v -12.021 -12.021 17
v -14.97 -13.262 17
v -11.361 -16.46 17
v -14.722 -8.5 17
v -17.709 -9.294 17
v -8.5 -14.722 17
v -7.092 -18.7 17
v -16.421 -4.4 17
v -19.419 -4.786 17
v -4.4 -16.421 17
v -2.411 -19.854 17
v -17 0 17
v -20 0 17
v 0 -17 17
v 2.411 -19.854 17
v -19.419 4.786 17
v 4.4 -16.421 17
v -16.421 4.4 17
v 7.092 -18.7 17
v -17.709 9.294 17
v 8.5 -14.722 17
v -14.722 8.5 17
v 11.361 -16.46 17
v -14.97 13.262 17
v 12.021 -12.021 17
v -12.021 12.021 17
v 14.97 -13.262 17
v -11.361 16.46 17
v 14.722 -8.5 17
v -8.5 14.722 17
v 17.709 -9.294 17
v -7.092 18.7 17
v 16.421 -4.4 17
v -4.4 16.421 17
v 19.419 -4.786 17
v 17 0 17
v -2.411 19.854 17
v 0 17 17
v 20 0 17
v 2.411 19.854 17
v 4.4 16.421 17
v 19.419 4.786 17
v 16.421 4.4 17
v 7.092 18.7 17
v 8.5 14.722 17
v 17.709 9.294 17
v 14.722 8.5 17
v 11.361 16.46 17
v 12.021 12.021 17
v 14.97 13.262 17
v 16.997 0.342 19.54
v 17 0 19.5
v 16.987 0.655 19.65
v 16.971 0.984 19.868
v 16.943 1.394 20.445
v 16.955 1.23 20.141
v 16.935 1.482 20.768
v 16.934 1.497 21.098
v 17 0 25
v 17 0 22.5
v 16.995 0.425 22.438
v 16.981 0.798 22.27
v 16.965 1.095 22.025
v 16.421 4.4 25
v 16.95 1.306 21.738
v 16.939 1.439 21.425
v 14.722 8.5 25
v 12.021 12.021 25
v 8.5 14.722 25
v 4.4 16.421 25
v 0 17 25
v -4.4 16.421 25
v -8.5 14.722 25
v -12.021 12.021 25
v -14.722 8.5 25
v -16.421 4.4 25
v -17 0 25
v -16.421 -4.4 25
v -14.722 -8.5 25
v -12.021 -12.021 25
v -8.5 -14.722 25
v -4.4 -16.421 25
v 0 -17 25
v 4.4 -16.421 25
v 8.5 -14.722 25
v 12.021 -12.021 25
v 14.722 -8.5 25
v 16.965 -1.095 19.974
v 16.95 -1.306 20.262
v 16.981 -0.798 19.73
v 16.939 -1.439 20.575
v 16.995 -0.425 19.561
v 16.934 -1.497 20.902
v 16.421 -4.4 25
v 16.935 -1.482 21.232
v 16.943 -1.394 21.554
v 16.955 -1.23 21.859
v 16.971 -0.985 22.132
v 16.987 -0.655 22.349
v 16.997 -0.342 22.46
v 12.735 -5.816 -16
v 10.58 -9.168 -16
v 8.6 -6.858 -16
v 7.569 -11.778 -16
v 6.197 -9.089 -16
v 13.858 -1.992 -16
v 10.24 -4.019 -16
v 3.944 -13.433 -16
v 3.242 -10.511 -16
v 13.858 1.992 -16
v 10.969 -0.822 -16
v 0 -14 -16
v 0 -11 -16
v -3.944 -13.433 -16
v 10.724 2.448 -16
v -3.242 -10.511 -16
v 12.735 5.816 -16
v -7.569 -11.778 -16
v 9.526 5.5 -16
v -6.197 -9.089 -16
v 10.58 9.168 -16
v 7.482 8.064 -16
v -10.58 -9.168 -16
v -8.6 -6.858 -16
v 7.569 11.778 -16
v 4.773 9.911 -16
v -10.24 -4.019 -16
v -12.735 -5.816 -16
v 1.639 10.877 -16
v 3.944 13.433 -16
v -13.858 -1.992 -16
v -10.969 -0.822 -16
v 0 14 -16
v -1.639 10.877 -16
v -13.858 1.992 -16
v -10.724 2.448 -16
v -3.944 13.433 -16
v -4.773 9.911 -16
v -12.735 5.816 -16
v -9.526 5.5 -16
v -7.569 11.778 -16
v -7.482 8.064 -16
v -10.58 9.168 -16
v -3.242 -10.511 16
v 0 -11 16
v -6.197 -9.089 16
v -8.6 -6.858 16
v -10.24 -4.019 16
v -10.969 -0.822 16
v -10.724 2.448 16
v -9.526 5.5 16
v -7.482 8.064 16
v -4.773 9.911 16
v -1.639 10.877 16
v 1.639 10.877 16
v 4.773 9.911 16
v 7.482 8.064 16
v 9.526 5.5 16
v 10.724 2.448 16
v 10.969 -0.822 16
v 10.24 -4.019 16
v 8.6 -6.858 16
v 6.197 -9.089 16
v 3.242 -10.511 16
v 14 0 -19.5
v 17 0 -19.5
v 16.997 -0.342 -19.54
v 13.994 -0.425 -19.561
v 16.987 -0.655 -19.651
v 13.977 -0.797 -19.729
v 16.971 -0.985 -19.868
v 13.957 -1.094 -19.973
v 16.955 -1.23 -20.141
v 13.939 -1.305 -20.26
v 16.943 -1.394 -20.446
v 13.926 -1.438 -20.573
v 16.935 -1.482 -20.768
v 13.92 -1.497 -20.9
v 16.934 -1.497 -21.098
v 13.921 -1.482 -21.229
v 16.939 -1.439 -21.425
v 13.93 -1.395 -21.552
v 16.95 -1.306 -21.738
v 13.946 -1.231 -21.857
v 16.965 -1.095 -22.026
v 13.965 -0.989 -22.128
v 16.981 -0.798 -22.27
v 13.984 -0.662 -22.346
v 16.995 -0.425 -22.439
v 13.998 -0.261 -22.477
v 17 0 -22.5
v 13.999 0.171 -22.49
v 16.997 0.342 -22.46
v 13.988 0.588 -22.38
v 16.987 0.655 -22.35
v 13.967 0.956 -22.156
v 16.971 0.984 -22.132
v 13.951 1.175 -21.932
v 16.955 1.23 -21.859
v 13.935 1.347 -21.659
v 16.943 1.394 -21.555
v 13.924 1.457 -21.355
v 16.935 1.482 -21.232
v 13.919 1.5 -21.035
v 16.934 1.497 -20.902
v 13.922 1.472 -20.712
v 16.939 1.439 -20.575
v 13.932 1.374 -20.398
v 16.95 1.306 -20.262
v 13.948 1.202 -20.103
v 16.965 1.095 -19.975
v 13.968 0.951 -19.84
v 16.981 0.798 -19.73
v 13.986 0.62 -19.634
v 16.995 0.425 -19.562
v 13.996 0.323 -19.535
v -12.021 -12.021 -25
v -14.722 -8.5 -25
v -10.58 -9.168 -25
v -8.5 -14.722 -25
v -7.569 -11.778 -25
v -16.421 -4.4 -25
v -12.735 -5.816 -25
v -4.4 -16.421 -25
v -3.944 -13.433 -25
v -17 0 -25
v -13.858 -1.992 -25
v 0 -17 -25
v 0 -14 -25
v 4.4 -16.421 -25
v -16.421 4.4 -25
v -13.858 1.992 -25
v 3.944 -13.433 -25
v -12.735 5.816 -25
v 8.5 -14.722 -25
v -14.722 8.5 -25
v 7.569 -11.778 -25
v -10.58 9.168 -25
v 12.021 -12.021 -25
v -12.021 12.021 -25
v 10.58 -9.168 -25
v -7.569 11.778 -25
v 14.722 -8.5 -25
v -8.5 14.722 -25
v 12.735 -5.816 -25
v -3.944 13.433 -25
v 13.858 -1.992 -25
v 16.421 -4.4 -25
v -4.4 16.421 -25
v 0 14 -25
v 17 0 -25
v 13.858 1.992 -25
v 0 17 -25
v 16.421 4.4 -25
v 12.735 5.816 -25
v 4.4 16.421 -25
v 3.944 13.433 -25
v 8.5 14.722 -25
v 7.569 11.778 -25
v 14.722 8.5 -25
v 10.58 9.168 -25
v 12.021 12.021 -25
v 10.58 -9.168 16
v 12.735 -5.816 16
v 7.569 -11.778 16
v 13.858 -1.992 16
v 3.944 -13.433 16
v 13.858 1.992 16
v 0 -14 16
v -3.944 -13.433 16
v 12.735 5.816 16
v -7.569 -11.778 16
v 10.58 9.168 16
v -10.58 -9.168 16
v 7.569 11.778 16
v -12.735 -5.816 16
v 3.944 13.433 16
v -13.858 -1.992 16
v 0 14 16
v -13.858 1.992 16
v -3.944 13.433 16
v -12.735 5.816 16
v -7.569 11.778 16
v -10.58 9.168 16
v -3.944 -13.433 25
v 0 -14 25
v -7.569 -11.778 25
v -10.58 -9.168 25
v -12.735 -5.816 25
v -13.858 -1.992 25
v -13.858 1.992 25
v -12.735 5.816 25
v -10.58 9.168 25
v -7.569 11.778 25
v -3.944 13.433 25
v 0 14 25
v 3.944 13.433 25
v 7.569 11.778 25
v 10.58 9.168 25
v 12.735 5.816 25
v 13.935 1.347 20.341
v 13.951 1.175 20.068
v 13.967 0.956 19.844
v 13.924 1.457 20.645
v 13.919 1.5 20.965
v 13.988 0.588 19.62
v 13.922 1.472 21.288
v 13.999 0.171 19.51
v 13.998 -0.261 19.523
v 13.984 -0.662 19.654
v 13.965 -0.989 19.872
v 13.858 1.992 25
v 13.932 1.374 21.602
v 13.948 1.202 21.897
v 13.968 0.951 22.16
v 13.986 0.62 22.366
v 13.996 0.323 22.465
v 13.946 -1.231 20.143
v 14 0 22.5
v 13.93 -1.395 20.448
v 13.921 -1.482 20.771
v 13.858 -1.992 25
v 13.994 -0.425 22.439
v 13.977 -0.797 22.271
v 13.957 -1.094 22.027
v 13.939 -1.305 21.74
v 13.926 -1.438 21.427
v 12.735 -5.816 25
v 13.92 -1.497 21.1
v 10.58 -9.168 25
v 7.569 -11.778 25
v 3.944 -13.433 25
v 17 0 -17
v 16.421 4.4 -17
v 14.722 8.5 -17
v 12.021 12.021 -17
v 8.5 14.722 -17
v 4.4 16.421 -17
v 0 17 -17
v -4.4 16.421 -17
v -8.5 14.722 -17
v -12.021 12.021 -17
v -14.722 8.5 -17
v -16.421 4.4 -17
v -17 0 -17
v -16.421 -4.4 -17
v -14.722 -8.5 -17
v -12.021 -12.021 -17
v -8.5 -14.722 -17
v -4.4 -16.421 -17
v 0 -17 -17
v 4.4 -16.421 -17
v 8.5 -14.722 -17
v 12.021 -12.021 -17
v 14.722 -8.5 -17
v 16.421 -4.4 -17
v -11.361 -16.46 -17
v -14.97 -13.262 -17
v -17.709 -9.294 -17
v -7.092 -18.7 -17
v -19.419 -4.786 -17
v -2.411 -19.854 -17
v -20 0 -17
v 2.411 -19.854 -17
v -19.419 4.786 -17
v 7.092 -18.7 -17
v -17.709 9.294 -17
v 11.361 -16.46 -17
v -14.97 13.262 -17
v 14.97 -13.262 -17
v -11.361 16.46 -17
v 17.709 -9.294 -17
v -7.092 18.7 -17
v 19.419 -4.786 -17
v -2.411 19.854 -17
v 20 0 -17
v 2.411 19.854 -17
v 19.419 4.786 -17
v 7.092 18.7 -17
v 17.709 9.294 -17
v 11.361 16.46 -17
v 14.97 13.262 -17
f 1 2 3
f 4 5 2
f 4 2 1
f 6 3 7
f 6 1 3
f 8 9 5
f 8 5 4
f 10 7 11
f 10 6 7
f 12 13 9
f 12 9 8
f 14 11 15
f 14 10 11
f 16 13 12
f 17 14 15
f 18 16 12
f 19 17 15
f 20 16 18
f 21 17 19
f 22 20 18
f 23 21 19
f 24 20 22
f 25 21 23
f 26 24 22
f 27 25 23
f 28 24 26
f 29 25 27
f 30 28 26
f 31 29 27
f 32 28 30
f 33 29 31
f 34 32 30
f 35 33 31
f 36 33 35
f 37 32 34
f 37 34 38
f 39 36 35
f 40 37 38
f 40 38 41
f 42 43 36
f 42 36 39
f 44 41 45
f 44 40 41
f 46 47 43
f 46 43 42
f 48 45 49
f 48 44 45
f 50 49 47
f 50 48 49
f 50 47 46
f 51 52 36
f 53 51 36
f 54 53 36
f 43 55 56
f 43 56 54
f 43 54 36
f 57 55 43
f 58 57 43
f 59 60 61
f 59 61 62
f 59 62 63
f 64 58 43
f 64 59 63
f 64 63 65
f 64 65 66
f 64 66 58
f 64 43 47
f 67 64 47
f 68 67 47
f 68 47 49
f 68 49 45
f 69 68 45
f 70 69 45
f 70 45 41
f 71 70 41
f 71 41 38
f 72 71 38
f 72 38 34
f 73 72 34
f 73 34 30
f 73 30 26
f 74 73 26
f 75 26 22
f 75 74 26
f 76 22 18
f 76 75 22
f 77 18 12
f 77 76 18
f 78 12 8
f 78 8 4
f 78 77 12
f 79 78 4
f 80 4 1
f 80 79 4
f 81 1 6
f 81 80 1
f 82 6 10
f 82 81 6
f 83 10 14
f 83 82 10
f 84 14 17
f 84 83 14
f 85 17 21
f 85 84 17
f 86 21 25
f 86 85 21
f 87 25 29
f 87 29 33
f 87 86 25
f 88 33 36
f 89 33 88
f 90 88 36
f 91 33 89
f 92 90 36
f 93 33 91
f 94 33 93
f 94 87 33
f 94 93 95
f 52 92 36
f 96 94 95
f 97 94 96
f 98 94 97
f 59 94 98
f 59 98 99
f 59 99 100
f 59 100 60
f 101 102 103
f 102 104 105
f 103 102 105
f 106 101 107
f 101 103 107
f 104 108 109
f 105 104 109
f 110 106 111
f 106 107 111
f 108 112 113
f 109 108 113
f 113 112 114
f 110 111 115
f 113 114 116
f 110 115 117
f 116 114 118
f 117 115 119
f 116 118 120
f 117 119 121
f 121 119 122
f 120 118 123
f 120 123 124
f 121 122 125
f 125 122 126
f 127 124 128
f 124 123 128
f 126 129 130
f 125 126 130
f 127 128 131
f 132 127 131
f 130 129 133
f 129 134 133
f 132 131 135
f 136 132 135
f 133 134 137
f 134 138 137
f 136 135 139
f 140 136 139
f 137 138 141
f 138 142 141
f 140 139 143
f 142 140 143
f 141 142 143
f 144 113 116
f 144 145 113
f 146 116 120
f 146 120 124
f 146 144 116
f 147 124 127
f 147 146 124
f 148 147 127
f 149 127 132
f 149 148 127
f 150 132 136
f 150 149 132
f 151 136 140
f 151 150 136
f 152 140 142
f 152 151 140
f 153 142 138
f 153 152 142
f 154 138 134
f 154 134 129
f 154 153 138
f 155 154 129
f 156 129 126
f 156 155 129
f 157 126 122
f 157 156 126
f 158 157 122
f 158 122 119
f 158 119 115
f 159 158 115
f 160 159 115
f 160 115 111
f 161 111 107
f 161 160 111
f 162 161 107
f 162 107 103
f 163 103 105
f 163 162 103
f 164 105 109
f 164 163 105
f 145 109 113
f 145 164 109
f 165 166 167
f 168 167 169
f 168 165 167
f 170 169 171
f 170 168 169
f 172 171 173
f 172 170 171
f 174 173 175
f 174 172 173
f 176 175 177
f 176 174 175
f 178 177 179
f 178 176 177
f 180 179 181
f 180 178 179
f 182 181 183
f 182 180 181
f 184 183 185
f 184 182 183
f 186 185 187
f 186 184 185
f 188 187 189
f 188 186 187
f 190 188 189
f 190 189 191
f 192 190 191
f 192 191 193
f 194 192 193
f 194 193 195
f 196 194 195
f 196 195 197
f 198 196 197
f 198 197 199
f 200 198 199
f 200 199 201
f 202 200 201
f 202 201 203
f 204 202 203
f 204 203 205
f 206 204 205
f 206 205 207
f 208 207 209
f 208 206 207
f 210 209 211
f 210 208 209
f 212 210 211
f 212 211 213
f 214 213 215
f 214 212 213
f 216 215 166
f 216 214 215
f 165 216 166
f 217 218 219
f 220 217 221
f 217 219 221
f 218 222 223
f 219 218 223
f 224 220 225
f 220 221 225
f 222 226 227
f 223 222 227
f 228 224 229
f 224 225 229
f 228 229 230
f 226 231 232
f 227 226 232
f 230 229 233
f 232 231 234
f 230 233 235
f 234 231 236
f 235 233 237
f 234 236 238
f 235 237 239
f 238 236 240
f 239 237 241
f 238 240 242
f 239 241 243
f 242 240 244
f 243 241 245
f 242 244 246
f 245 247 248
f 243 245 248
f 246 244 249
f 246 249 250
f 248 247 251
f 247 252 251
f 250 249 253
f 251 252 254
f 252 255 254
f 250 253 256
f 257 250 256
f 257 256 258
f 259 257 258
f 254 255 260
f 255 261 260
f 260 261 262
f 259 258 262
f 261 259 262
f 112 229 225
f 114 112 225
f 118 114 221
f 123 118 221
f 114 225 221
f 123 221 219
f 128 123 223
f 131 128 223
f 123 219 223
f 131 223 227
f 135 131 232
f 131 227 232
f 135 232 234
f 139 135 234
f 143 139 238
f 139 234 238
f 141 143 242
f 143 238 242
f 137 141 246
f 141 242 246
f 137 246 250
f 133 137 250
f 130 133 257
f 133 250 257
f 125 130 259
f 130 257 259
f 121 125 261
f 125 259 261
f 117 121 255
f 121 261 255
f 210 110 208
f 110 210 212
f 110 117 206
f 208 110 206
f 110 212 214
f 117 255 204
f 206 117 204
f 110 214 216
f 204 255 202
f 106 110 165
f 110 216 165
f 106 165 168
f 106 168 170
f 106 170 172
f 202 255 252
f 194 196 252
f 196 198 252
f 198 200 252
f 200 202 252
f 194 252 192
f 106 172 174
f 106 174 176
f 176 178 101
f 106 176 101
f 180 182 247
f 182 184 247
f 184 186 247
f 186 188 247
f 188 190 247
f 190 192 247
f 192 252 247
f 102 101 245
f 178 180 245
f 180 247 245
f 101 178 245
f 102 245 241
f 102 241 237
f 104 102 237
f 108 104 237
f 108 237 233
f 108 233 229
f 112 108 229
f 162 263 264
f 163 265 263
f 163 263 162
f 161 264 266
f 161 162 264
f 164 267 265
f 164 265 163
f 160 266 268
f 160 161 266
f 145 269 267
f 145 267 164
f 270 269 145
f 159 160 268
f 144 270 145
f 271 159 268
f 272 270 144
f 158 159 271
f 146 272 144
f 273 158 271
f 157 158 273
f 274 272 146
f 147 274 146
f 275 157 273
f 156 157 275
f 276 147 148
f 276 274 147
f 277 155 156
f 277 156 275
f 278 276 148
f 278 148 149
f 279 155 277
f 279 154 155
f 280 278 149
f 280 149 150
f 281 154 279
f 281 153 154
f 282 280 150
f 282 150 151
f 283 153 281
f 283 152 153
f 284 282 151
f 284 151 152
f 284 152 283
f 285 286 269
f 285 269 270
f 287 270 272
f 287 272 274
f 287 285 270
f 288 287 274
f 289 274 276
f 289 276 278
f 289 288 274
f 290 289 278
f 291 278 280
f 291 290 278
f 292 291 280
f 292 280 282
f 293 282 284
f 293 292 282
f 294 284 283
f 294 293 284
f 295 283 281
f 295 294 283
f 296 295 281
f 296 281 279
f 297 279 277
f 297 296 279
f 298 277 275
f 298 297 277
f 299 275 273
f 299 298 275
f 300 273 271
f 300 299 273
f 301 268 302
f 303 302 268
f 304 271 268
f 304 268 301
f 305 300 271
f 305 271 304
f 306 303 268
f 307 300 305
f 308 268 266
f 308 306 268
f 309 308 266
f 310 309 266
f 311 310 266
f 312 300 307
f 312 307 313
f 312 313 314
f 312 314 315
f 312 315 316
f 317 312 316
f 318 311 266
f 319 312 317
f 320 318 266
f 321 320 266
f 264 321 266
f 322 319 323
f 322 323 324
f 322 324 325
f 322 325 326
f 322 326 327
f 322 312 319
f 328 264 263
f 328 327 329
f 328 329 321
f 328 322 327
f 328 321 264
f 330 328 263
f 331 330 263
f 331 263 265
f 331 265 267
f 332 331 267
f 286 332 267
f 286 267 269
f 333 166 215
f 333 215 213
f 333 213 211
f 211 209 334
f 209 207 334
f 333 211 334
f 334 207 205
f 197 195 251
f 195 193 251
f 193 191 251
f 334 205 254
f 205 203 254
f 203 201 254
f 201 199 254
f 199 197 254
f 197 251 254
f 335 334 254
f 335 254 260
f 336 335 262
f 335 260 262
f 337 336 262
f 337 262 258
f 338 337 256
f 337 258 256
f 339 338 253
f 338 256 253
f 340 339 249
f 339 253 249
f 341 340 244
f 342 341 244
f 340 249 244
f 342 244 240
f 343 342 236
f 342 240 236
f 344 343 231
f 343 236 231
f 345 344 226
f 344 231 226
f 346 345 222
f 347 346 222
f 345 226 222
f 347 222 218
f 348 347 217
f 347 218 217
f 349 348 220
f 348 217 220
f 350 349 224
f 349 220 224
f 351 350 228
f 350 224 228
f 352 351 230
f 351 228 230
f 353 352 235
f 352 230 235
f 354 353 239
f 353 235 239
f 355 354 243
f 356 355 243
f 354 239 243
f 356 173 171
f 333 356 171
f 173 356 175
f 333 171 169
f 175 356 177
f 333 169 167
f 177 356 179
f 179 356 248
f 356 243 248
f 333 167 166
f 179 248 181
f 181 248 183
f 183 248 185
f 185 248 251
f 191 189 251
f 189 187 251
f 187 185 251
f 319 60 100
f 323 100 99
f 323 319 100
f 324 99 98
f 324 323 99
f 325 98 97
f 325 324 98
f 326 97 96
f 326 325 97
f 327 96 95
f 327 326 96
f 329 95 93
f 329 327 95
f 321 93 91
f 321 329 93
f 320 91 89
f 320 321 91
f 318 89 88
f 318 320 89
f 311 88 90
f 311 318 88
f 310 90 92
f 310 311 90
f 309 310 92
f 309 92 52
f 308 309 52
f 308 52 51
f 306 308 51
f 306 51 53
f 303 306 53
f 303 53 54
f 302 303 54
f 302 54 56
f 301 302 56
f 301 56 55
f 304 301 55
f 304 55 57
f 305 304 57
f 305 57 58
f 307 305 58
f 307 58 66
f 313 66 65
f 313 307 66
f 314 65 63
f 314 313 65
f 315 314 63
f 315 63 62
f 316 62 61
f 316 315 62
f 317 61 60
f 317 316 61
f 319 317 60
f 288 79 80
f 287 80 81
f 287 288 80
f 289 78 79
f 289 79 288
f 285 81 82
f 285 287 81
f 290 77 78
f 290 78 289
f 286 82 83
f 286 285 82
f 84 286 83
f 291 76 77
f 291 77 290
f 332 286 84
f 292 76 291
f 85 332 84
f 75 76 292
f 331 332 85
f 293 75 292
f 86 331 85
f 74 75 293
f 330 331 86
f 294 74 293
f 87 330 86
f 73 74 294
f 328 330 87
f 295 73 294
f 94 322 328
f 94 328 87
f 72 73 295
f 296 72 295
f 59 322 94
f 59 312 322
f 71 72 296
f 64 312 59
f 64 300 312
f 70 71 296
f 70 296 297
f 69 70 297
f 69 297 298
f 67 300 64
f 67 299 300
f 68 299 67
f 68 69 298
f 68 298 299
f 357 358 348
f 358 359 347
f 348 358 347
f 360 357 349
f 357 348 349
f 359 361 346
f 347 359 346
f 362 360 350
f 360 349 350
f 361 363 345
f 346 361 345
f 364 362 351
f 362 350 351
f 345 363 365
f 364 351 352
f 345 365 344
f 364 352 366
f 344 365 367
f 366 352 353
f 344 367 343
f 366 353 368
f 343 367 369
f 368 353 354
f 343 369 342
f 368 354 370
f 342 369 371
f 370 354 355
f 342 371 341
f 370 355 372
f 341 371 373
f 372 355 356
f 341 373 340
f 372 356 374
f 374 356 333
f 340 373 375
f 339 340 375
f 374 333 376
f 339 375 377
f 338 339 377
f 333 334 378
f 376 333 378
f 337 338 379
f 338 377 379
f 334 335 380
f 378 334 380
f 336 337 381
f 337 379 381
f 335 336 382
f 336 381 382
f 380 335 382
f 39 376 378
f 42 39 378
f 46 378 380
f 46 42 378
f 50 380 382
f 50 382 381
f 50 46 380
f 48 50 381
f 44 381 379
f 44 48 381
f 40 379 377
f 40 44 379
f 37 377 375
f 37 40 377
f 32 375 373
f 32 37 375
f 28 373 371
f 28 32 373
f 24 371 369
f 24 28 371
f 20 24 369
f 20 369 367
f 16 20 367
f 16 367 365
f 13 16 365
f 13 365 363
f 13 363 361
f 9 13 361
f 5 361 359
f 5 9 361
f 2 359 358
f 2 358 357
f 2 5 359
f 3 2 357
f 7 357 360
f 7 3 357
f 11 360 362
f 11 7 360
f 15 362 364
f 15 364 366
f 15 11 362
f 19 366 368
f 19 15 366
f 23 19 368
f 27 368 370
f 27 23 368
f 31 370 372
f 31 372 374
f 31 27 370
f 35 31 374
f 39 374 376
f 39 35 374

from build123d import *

# Parameters (mm, degrees)
SKETCH1_R               = 20
BOSS_EXTRUDE1_DEPTH     = 25
SKETCH4_R               = 20
SKETCH4_R_2             = 17
CUT_EXTRUDE1_DEPTH      = 8
CUT_EXTRUDE2_REACH      = 39.749
CUT_EXTRUDE2_END_RADIUS = 17
SKETCH5_R               = 1.5


with BuildPart() as part:
    # Sketch1 → Boss-Extrude1 (new, symmetric)
    with BuildSketch(Plane.XY):
        Circle(SKETCH1_R)
    extrude(amount=BOSS_EXTRUDE1_DEPTH, both=True)

    # Sketch3 → Hole1 (revolve, cut)
    with BuildSketch(Plane(origin=(0, 0, 25), x_dir=(0, -1, 0), z_dir=(1, 0, 0))):
        Polygon((0, 0), (0, 56.609466809), (11, 50), (11, 9), (14, 9), (14, 0), align=None)
    hole1 = revolve(axis=Axis((0, 0, 36.310875039), (0, 0, -1)), mode=Mode.SUBTRACT)

    # Sketch4 → Cut-Extrude1 (cut)
    with BuildSketch(Plane.XY.offset(25)):
        Circle(SKETCH4_R)
        Circle(SKETCH4_R_2, mode=Mode.SUBTRACT)
    cut_extrude1 = extrude(amount=-CUT_EXTRUDE1_DEPTH, mode=Mode.SUBTRACT)

    # Mirror2: Hole1, Cut-Extrude1 across plane
    add(hole1.mirror(Plane.XY), mode=Mode.SUBTRACT)
    add(cut_extrude1.mirror(Plane.XY), mode=Mode.SUBTRACT)

    # Cut-Extrude2: up to this cylinder (the profile starts inside it)
    cut_extrude2_end = Plane(origin=(0, 0, 0), z_dir=(0, 0, 1)) * Cylinder(CUT_EXTRUDE2_END_RADIUS, 156.498, mode=Mode.PRIVATE)
    # Sketch5 → Cut-Extrude2 (cut, up to the surface)
    with BuildSketch(Plane(origin=(0, 0, 0), x_dir=(0, 0, -1), z_dir=(1, 0, 0)), mode=Mode.PRIVATE) as cut_extrude2_sk1:
        with Locations(Location((-21, 0, 0), (0, 0, 180))):
            Circle(SKETCH5_R)
    cut_extrude2_tool1 = extrude(cut_extrude2_sk1.sketch, amount=CUT_EXTRUDE2_REACH, mode=Mode.PRIVATE) & cut_extrude2_end
    add(cut_extrude2_tool1.solids().sort_by_distance((0, 0, 21))[0], mode=Mode.SUBTRACT)
    # Sketch5 → Cut-Extrude2 (cut, up to the surface)
    with BuildSketch(Plane(origin=(0, 0, 0), x_dir=(0, 0, -1), z_dir=(1, 0, 0)), mode=Mode.PRIVATE) as cut_extrude2_sk2:
        with Locations(Location((21, 0, 0), (0, 0, 180))):
            Circle(SKETCH5_R)
    cut_extrude2_tool2 = extrude(cut_extrude2_sk2.sketch, amount=CUT_EXTRUDE2_REACH, mode=Mode.PRIVATE) & cut_extrude2_end
    add(cut_extrude2_tool2.solids().sort_by_distance((0, 0, -21))[0], mode=Mode.SUBTRACT)


solid = part.part
